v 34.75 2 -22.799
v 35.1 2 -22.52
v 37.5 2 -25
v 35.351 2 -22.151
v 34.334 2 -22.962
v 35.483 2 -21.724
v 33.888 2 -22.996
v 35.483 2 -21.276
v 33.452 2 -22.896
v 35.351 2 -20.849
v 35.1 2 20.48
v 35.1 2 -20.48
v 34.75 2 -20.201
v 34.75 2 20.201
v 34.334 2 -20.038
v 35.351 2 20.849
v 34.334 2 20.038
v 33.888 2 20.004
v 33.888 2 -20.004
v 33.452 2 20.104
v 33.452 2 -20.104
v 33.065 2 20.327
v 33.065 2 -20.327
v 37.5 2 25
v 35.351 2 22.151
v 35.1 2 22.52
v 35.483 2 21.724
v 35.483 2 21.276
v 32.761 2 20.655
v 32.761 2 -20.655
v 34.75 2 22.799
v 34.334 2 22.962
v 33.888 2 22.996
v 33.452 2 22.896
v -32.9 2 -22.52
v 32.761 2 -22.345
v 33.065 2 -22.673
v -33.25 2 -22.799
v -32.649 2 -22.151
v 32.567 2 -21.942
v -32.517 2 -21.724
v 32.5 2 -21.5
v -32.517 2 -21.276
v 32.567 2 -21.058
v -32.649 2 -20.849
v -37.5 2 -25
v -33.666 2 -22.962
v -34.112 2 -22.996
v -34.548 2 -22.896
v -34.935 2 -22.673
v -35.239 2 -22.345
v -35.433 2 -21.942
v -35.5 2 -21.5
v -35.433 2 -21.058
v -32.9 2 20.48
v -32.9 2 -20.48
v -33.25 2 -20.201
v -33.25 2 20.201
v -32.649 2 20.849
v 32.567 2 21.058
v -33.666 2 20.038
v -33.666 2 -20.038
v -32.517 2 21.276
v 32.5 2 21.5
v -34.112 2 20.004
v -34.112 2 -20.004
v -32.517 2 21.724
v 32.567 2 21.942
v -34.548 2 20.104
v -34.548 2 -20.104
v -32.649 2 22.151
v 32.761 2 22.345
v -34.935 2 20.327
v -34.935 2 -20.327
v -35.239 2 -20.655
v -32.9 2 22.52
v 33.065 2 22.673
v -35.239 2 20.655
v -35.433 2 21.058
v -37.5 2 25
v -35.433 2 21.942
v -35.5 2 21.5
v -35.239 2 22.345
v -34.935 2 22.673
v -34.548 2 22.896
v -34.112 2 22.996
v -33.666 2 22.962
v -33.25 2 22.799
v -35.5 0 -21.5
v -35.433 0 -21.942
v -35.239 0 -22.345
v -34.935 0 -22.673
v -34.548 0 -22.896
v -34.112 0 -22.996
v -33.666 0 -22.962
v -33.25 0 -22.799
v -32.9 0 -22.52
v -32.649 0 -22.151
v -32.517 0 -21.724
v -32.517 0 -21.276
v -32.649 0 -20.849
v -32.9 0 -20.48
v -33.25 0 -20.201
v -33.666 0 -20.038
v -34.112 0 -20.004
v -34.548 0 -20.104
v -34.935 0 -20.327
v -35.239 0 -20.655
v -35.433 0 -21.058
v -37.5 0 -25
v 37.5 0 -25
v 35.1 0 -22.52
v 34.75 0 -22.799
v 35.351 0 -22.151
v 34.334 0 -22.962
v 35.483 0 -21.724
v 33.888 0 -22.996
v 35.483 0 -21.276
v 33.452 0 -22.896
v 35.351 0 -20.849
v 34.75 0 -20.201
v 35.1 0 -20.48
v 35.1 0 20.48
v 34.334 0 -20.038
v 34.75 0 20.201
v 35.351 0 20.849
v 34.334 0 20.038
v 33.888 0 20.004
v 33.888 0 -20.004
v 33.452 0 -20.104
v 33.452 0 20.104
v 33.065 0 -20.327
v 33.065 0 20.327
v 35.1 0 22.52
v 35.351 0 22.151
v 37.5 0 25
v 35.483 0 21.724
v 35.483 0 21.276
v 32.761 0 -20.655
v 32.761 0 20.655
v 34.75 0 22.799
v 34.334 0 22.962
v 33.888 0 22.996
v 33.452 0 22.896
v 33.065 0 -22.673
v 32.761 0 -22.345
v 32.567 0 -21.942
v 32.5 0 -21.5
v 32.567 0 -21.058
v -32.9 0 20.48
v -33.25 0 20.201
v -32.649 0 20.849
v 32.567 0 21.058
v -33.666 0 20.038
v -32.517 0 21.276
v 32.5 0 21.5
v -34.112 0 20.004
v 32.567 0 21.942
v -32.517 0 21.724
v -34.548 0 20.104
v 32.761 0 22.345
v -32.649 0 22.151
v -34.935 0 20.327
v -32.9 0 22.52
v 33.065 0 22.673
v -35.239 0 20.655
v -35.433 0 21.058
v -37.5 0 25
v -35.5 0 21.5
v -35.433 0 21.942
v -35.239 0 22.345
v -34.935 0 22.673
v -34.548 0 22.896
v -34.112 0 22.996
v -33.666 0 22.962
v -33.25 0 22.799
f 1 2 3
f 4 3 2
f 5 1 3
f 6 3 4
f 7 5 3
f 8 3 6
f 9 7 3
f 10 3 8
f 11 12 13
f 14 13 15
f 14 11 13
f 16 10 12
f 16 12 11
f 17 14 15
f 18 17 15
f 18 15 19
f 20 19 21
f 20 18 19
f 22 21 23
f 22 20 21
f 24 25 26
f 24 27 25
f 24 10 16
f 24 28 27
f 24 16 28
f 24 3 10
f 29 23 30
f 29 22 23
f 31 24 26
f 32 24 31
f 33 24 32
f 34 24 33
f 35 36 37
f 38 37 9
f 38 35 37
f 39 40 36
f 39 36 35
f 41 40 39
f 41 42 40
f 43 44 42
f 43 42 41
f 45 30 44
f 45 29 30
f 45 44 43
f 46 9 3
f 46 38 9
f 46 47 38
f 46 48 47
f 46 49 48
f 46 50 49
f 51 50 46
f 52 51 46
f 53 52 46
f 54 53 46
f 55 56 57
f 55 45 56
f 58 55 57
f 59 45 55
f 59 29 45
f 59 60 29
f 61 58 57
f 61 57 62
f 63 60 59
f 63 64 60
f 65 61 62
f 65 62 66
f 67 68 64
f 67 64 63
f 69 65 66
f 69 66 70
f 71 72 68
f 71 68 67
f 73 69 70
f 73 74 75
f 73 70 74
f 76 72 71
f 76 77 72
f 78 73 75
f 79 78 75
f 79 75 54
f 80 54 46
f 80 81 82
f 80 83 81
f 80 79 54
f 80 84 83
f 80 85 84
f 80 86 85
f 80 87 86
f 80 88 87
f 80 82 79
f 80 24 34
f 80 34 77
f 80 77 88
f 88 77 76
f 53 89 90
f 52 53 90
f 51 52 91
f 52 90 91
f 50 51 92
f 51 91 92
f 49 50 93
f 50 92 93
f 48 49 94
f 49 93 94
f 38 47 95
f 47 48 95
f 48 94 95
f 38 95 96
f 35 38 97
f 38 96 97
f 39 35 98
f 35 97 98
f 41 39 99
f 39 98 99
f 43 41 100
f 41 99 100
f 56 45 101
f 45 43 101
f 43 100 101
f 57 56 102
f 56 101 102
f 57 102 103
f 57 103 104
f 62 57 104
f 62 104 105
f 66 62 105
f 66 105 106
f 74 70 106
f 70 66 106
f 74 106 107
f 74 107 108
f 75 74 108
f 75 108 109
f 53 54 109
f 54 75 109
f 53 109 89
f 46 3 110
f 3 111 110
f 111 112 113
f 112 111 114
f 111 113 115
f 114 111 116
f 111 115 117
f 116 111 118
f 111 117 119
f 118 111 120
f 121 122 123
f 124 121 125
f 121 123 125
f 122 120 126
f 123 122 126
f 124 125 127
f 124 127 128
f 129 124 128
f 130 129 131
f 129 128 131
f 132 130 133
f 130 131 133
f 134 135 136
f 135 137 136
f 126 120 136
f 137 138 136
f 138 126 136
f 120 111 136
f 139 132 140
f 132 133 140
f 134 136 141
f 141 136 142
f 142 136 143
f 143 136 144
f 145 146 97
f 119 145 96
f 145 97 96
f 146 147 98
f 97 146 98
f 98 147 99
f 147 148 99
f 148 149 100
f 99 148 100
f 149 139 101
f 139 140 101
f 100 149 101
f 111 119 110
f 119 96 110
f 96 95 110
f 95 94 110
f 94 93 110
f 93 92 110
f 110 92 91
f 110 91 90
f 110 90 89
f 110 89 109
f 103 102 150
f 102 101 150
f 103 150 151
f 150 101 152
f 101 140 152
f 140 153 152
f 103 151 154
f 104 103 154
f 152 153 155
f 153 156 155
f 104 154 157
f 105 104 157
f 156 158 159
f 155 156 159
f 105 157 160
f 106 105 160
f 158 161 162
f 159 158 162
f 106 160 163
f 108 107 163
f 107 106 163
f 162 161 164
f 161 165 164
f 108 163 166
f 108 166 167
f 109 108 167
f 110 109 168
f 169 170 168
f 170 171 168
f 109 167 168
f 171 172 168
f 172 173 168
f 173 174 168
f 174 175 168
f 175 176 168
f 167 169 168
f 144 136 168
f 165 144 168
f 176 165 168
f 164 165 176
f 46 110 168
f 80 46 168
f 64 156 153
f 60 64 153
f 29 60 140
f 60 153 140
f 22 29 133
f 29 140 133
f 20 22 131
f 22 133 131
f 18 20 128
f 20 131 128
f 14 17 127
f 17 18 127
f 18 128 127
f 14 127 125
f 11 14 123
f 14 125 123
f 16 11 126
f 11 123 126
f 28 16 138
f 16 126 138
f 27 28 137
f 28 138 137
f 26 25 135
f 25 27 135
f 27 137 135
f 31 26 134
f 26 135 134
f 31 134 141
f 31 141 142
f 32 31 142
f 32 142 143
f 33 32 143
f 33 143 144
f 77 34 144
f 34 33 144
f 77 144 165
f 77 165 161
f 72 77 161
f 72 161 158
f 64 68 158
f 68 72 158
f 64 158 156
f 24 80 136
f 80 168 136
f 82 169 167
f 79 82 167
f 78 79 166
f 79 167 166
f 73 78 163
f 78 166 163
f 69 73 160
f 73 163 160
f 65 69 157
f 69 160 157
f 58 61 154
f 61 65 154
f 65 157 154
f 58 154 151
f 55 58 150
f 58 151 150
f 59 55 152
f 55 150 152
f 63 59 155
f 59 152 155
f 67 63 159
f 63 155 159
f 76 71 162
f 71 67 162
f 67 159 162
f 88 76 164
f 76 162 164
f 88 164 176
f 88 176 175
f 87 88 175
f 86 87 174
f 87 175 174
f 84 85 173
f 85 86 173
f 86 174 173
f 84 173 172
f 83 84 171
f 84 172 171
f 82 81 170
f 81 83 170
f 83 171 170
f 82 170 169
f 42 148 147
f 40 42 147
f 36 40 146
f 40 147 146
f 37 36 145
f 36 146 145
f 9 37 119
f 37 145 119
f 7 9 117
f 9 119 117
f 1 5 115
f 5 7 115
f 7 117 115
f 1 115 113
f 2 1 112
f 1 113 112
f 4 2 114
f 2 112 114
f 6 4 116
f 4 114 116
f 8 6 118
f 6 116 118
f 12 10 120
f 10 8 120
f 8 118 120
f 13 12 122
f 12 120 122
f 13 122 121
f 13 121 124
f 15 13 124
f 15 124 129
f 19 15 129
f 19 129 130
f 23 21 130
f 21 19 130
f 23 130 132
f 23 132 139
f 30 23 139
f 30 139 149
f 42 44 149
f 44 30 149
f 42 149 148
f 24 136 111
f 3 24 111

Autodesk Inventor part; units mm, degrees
ref_plane "YZ Plane" through (0, 0, 0) normal (1, 0, 0) x (0, 1, 0)
ref_plane "XZ Plane" through (0, 0, 0) normal (0, 1, 0) x (-1, 0, 0)
ref_plane "XY Plane" through (0, 0, 0) normal (0, 0, 1) x (1, 0, 0)
sketch "Boceto1" plane through (0, 0, 0) normal (0, 1, 0) x (-1, 0, 0)
  line L0 (37.5, 25) -> (-37.5, 25)
  line L1 (-37.5, 25) -> (-37.5, -25)
  line L2 (-37.5, -25) -> (37.5, -25)
  line L3 (37.5, -25) -> (37.5, 25)
  line L4 (34, 21.5) -> (-34, 21.5) construction
  line L5 (-34, 21.5) -> (-34, -21.5) construction
  line L6 (-34, -21.5) -> (34, -21.5) construction
  line L7 (34, -21.5) -> (34, 21.5) construction
  circle A0 centre (34, 21.5) radius 1.5
  circle A1 centre (34, -21.5) radius 1.5
  circle A2 centre (-34, -21.5) radius 1.5
  circle A3 centre (-34, 21.5) radius 1.5
  point P0 (0, 0)
  point P1 (37.5, 0)
  point P2 (0, 25)
  dimension "d0" = 3
  dimension "d1" = 3.5
  dimension "d2" = 50
  dimension "d3" = 75
  dimension "d6" = 43
  dimension "d7" = 68
extrude "Extrusión1" add sketch "Boceto1" along normal blind 2
properties part number "driver motor"
